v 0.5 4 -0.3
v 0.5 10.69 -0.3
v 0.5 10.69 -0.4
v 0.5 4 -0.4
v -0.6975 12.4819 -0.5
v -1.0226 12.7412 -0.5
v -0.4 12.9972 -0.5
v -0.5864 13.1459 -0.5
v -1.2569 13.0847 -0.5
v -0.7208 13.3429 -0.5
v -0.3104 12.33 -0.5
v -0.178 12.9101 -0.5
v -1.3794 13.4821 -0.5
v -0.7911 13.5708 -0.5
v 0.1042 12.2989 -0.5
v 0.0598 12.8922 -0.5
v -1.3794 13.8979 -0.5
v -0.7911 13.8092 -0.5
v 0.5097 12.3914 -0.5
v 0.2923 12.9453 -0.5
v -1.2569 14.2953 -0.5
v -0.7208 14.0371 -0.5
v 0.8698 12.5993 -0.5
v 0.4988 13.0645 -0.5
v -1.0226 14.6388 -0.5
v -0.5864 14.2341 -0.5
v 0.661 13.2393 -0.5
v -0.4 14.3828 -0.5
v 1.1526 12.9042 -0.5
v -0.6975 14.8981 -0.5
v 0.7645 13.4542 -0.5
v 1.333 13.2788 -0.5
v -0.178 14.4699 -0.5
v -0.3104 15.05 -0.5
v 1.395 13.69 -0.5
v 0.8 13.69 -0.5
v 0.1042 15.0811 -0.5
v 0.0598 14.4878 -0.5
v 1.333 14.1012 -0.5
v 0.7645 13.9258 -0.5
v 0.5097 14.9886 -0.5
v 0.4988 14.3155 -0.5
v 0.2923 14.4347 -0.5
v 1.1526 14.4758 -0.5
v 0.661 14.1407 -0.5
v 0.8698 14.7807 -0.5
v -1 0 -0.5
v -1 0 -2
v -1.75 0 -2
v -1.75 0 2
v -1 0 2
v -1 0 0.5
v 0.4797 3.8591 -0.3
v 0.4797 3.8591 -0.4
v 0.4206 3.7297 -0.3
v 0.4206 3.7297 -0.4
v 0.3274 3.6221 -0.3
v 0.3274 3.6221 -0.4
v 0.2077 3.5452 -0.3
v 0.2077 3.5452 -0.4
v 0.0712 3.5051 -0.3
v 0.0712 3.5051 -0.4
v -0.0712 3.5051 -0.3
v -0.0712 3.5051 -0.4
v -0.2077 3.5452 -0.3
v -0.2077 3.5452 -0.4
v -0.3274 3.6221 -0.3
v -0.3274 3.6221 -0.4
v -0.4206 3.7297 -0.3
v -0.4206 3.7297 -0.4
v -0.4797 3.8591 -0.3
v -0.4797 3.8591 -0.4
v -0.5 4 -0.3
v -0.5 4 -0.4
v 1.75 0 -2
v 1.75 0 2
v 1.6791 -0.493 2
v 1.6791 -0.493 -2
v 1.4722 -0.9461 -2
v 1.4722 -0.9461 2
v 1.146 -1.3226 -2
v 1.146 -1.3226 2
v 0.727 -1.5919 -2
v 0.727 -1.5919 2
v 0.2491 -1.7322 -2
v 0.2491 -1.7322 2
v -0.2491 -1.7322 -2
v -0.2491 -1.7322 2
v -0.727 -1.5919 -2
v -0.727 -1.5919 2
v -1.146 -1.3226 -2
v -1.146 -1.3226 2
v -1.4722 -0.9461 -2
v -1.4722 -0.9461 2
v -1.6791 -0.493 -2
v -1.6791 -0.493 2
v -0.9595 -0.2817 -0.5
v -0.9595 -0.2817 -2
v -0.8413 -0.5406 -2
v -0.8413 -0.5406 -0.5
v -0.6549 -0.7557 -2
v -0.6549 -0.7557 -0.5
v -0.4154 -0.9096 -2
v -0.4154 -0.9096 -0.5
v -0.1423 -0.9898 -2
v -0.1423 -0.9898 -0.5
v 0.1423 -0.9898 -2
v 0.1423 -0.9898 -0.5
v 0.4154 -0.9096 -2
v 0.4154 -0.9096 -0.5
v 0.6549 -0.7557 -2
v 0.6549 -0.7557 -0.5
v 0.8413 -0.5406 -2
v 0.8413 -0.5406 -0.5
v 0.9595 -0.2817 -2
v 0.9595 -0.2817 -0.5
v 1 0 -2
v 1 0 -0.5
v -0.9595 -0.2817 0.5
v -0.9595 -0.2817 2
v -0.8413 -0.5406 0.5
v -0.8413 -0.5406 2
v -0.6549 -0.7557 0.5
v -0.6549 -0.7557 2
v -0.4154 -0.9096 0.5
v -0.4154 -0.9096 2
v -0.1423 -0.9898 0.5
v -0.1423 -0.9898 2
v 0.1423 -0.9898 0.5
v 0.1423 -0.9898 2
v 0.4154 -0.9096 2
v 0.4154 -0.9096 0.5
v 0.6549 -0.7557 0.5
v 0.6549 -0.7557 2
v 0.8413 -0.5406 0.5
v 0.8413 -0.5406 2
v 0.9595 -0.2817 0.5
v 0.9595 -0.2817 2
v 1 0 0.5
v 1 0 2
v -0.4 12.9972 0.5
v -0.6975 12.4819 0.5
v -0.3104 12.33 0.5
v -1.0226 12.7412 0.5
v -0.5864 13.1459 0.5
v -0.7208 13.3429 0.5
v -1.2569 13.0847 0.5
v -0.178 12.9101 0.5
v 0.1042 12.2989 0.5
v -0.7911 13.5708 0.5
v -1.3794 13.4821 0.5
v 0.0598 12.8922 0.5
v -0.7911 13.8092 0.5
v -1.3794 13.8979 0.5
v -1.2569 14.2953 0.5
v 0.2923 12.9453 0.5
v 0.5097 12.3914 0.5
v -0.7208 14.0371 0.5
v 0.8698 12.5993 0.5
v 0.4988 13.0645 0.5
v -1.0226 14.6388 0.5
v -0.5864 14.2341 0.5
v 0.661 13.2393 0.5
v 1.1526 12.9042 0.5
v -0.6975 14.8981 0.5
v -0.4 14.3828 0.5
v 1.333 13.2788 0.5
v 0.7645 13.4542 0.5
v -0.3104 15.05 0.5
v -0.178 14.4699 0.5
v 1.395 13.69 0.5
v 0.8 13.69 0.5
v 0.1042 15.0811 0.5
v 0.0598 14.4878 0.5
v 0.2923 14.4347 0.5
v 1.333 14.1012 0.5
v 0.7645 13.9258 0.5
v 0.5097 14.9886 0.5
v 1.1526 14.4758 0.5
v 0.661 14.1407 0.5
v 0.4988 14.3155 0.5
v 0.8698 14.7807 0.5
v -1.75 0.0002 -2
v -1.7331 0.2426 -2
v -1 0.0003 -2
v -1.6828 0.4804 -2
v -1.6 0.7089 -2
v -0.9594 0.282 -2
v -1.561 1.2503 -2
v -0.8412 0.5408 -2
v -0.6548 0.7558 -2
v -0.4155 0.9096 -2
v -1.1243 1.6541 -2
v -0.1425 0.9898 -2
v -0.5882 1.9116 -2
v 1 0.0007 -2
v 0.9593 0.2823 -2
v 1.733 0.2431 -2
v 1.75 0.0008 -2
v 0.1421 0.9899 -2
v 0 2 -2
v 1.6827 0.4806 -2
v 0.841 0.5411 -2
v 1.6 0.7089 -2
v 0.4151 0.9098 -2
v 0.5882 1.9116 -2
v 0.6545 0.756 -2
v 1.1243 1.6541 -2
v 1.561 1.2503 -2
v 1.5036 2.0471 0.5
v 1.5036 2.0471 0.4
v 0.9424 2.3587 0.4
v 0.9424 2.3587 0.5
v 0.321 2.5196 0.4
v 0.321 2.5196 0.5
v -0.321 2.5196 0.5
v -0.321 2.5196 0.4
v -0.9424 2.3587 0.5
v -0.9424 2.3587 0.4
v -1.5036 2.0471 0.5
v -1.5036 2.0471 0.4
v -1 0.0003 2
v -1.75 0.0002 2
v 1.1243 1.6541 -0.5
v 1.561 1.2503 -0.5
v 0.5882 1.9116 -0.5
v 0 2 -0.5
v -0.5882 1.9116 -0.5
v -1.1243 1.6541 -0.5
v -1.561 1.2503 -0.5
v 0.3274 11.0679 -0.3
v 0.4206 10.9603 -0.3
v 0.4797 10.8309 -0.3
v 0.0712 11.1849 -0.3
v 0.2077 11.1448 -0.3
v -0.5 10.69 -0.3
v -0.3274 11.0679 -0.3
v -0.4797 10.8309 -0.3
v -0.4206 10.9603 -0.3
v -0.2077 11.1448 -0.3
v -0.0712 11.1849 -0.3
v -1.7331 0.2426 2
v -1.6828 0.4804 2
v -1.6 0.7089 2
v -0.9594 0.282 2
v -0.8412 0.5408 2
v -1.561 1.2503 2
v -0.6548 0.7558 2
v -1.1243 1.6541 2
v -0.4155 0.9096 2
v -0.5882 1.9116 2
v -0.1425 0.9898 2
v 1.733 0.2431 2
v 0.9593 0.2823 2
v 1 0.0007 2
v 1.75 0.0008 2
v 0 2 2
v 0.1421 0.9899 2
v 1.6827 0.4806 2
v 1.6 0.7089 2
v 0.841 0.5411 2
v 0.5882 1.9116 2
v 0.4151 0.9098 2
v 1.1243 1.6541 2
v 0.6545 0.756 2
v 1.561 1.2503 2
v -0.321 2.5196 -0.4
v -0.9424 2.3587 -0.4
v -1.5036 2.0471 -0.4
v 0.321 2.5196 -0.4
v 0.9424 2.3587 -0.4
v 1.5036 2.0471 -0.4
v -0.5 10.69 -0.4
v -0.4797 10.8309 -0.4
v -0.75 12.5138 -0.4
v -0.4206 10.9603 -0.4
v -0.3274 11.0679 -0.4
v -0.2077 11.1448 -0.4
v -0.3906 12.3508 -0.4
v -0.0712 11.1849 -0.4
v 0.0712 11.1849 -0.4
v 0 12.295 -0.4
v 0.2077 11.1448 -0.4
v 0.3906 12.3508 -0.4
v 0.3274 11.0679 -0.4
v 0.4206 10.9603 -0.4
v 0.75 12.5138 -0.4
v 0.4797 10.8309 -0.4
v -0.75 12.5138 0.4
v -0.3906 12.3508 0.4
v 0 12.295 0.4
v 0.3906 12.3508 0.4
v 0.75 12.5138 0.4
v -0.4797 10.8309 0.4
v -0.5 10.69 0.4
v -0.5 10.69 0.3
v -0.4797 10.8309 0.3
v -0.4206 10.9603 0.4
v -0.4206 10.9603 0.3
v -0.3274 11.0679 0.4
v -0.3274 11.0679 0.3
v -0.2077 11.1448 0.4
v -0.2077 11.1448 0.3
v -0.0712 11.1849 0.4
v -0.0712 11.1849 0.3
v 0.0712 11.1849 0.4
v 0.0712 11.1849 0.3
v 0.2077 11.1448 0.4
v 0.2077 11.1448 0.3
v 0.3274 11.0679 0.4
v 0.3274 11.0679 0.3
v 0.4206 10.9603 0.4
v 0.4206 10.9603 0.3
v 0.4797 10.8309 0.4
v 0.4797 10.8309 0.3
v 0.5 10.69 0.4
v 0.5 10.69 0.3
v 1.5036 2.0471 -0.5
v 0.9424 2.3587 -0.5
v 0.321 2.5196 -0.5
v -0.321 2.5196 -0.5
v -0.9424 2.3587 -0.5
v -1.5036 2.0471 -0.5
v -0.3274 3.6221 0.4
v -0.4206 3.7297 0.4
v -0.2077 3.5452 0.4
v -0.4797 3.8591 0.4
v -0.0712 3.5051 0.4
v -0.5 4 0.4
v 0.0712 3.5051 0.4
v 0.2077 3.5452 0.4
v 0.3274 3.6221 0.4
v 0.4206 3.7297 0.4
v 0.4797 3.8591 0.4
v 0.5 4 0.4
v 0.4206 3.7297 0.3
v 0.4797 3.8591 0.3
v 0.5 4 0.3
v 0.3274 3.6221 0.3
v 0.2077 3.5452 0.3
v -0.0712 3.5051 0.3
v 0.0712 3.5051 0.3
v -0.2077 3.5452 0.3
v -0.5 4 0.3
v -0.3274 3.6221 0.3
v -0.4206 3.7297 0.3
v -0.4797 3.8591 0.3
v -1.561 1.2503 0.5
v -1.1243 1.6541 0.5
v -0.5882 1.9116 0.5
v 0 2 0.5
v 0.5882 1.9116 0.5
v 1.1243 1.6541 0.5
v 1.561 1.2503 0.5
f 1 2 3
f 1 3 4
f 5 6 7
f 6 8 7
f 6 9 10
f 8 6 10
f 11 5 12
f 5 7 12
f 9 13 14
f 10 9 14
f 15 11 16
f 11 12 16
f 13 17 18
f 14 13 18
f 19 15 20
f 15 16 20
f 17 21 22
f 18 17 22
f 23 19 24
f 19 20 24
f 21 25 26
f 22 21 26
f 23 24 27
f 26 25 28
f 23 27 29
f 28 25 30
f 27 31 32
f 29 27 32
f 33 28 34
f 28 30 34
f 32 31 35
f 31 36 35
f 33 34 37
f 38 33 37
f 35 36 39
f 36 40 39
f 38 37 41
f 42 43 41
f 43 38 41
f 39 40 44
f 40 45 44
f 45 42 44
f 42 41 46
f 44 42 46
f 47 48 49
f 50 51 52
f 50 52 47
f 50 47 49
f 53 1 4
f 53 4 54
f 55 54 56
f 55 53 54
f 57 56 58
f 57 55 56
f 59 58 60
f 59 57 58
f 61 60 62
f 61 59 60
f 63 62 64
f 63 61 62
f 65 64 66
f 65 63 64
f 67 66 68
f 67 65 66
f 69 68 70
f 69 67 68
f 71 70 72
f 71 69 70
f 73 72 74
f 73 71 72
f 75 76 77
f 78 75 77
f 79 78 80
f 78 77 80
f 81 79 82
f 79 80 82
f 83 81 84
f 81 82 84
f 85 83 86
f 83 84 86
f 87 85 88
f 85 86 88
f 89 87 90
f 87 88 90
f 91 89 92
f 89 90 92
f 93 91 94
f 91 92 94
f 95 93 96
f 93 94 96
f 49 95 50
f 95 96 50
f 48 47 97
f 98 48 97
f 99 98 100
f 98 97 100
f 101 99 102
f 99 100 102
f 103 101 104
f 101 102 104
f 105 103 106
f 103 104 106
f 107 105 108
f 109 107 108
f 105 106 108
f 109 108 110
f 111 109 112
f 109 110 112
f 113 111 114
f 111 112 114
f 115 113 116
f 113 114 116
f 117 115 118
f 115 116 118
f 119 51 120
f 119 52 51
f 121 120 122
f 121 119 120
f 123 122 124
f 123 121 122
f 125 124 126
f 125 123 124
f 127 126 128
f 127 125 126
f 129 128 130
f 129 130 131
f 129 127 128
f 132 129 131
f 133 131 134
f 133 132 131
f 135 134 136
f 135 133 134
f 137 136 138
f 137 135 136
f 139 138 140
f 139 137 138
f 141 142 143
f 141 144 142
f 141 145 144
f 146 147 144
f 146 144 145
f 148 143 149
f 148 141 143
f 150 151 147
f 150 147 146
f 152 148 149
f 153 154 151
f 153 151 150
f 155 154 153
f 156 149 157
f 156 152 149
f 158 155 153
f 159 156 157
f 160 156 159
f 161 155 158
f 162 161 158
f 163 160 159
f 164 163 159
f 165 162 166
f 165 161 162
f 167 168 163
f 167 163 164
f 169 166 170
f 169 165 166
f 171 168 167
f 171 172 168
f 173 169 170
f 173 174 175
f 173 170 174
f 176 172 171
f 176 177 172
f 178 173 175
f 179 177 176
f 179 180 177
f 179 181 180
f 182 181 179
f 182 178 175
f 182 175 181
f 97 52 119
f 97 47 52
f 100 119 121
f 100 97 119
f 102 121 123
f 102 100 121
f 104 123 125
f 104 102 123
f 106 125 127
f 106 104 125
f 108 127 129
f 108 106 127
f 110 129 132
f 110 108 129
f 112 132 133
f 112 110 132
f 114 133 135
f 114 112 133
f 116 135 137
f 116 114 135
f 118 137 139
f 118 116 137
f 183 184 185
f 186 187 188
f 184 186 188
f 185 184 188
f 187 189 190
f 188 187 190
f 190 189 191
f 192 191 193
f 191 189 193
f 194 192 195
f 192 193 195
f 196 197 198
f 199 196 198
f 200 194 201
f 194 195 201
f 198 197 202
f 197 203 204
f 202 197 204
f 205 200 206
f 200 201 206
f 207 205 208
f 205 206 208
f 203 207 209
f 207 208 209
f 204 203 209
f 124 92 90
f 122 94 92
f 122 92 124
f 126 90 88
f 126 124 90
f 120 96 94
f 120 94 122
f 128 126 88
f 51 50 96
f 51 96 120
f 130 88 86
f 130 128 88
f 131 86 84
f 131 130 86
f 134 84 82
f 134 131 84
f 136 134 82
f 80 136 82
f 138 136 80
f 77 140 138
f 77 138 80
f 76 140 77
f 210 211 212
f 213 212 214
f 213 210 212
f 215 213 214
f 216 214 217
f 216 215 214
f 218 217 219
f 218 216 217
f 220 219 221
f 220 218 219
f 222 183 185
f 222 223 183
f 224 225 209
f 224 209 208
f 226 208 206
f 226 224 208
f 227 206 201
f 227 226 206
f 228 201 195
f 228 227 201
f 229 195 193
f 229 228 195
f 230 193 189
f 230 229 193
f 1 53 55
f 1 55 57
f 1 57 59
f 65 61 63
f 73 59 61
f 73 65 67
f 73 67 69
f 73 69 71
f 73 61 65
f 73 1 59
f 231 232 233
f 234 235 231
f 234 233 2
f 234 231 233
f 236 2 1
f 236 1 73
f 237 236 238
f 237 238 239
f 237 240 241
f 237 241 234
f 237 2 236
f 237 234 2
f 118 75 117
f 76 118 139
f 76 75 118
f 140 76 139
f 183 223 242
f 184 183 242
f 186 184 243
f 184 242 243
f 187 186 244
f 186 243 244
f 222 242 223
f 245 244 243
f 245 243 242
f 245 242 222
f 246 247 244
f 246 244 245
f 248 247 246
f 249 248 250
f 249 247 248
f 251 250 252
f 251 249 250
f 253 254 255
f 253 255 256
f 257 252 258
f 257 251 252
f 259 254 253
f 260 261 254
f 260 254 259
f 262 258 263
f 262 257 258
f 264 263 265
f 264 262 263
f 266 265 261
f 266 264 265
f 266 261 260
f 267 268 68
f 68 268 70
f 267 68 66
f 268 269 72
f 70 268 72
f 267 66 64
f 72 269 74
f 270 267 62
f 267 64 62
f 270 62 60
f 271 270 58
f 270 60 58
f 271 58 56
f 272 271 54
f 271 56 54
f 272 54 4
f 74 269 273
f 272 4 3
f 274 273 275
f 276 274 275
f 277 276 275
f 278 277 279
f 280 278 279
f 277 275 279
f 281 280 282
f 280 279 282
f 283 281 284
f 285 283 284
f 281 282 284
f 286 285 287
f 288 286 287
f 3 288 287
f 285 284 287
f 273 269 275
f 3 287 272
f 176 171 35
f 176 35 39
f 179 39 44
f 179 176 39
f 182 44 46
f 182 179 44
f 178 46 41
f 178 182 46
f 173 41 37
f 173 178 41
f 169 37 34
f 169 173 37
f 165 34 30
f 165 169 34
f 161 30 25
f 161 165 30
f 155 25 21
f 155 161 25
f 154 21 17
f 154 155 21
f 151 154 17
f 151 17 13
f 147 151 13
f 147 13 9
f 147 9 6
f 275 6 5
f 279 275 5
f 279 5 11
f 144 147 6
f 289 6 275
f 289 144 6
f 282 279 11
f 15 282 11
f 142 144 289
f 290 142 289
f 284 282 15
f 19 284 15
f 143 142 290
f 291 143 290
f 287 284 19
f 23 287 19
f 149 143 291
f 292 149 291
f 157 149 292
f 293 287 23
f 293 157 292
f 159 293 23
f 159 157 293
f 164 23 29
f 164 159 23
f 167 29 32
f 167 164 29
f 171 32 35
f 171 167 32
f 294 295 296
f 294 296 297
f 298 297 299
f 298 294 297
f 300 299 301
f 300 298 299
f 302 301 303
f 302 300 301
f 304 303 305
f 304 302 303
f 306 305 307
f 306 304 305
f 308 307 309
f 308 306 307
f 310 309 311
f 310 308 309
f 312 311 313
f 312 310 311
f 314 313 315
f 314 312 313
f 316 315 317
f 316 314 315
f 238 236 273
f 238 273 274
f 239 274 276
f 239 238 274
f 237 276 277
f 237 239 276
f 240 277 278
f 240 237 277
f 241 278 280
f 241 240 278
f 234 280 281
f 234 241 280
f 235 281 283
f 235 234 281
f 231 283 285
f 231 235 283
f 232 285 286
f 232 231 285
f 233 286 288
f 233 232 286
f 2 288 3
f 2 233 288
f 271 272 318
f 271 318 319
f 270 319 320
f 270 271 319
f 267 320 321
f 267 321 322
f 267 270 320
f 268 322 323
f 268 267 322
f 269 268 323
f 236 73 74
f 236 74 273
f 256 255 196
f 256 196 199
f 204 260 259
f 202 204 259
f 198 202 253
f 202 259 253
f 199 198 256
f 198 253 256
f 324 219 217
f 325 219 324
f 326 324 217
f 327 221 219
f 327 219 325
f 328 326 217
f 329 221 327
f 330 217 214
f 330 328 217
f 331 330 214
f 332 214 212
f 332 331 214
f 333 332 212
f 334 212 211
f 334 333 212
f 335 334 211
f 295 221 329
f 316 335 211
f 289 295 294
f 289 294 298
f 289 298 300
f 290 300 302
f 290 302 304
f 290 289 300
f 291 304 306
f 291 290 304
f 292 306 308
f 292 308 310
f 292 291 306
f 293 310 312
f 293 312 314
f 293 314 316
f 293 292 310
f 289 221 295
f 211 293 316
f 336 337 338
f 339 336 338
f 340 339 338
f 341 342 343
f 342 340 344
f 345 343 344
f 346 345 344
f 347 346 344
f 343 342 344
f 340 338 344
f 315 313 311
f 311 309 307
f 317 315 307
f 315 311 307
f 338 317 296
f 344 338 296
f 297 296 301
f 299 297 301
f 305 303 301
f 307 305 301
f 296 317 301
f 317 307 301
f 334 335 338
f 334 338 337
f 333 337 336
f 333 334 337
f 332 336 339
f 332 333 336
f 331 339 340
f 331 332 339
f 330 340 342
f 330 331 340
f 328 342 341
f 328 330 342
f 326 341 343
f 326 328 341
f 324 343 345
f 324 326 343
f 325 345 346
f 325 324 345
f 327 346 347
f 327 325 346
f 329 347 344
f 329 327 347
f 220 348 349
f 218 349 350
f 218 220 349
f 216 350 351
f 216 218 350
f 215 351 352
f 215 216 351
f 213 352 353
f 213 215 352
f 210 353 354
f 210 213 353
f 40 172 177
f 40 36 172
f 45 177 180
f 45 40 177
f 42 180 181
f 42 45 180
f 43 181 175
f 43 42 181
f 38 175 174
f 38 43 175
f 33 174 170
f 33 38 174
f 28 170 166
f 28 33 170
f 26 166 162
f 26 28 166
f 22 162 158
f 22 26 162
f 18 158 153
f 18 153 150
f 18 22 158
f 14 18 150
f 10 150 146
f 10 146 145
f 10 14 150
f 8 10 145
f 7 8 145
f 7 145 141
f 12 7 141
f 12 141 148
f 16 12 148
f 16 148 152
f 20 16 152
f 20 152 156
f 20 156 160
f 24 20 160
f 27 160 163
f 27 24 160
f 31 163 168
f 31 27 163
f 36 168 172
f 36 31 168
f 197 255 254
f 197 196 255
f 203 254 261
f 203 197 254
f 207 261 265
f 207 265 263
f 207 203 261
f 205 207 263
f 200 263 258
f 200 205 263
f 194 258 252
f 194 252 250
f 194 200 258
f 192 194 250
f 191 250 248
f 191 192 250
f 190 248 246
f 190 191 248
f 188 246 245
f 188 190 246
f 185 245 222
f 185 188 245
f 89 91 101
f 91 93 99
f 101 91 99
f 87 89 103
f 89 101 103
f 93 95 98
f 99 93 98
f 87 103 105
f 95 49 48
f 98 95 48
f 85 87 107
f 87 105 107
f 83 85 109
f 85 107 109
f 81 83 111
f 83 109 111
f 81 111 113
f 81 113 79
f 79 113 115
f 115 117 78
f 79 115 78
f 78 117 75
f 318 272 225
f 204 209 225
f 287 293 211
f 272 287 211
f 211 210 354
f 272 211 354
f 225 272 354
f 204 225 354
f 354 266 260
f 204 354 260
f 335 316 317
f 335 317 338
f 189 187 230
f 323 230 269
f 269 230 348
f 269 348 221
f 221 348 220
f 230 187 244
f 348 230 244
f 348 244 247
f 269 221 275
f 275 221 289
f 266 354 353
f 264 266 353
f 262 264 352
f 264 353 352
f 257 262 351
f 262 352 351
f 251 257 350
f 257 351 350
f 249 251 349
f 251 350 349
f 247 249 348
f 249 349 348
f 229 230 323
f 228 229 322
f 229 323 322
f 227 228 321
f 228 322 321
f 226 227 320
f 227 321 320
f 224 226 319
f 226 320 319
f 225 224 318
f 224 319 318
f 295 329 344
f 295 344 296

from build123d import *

# Parameters (mm, degrees)
SKETCH1_R                = 2.54
SKETCH1_R_2              = 1
BOSS_EXTRUDE1_DEPTH      = 0.5
SKETCH1_R_3              = 1.395
SKETCH1_R_4              = 0.8
BOSS_EXTRUDE1_2_DEPTH    = 0.5
BOSS_EXTRUDE2_DEPTH      = 0.4
BOSS_EXTRUDE3_DEPTH      = 0.3
BOSS_EXTRUDE4_DEPTH      = 1.5
BOSS_EXTRUDE4_DEPTH_BACK = 2.5
SKETCH2_R                = 2
SKETCH2_R_2              = 1
CUT_EXTRUDE1_DEPTH       = 20.75
CUT_EXTRUDE2_DEPTH       = 20.75


with BuildPart() as part:
    # Sketch1 → Boss-Extrude1 (new, symmetric)
    with BuildSketch(Plane.XY):
        Circle(SKETCH1_R)
        Circle(SKETCH1_R_2, mode=Mode.SUBTRACT)
    extrude(amount=BOSS_EXTRUDE1_DEPTH, both=True)



with BuildPart() as body_2:
    # Sketch1 → Boss-Extrude1 2 (new, symmetric)
    with BuildSketch(Plane.XY):
        with Locations((0, 13.69)):
            Circle(SKETCH1_R_3)
        with Locations((0, 13.69)):
            Circle(SKETCH1_R_4, mode=Mode.SUBTRACT)
    extrude(amount=BOSS_EXTRUDE1_2_DEPTH, both=True)


with BuildPart() as part_1:
    add(part.part)

    add(body_2.part)  # Boss-Extrude2 merges body 2
    # Sketch1<3> → Boss-Extrude2 (add, symmetric)
    with BuildSketch(Plane.XY):
        with BuildLine():
            Line((-0.75, 12.513766605), (-1.65, 1.931087776))
            ThreePointArc((-1.65, 1.931087776), (0, 2.54), (1.65, 1.931087776))
            Line((1.65, 1.931087776), (0.75, 12.513766605))
            ThreePointArc((0.75, 12.513766605), (0, 12.295), (-0.75, 12.513766605))
        make_face()
        with BuildLine():
            ThreePointArc((0.5, 4), (0, 3.5), (-0.5, 4))
            Line((-0.5, 4), (-0.5, 10.69))
            ThreePointArc((-0.5, 10.69), (0, 11.19), (0.5, 10.69))
            Line((0.5, 10.69), (0.5, 4))
        make_face(mode=Mode.SUBTRACT)
    extrude(amount=BOSS_EXTRUDE2_DEPTH, both=True)

    # Sketch1<4> → Boss-Extrude3 (add, symmetric)
    with BuildSketch(Plane.XY):
        with BuildLine():
            Line((-0.5, 4), (-0.5, 10.69))
            ThreePointArc((-0.5, 10.69), (0, 11.19), (0.5, 10.69))
            Line((0.5, 10.69), (0.5, 4))
            ThreePointArc((0.5, 4), (0, 3.5), (-0.5, 4))
        make_face()
    extrude(amount=BOSS_EXTRUDE3_DEPTH, both=True)

    # Sketch2 → Boss-Extrude4 (add, two sides: drawn at the far end of the back side and taken through both)
    with BuildSketch(Plane.XY.offset(0.5).offset(-BOSS_EXTRUDE4_DEPTH_BACK)):
        Circle(SKETCH2_R)
        Circle(SKETCH2_R_2, mode=Mode.SUBTRACT)
    extrude(amount=BOSS_EXTRUDE4_DEPTH + BOSS_EXTRUDE4_DEPTH_BACK)

    # Sketch3 → Cut-Extrude1 (cut, symmetric)
    with BuildSketch(Plane.XY):
        with BuildLine():
            Line((-0.75, 12.513766605), (-2.89360139, 1.969027932))
            ThreePointArc((-2.89360139, 1.969027932), (0, -3.5), (2.89360139, 1.969027932))
            Line((2.89360139, 1.969027932), (0.75, 12.513766605))
            Line((0.75, 12.513766605), (1.6, 0.708872344))
            ThreePointArc((1.6, 0.708872344), (0, -1.75), (-1.6, 0.708872344))
            Line((-1.6, 0.708872344), (-0.75, 12.513766605))
        make_face()
    extrude(amount=CUT_EXTRUDE1_DEPTH, both=True, mode=Mode.SUBTRACT)

    # Sketch4 → Cut-Extrude2 (cut, symmetric)
    with BuildSketch(Plane.XY):
        Polygon((2.586715497, 0), (-2.840346432, 0), (2.586715497, 0.001), align=None)
    extrude(amount=CUT_EXTRUDE2_DEPTH, both=True, mode=Mode.SUBTRACT)


with BuildPart() as cut_extrude2_piece_1:
    # of the separate pieces the step leaves, piece 1, a body of its own (cut_extrude2_pieces)
    add(part_1.part.solids().sort_by_distance((1.395, 13.69, -0.5))[0])


with BuildPart() as cut_extrude2_piece_2:
    # of the separate pieces the step leaves, piece 2, a body of its own (cut_extrude2_pieces)
    add(part_1.part.solids().sort_by_distance((-1.75, 0, -2))[0])


solid = Compound([cut_extrude2_piece_1.part, cut_extrude2_piece_2.part])
